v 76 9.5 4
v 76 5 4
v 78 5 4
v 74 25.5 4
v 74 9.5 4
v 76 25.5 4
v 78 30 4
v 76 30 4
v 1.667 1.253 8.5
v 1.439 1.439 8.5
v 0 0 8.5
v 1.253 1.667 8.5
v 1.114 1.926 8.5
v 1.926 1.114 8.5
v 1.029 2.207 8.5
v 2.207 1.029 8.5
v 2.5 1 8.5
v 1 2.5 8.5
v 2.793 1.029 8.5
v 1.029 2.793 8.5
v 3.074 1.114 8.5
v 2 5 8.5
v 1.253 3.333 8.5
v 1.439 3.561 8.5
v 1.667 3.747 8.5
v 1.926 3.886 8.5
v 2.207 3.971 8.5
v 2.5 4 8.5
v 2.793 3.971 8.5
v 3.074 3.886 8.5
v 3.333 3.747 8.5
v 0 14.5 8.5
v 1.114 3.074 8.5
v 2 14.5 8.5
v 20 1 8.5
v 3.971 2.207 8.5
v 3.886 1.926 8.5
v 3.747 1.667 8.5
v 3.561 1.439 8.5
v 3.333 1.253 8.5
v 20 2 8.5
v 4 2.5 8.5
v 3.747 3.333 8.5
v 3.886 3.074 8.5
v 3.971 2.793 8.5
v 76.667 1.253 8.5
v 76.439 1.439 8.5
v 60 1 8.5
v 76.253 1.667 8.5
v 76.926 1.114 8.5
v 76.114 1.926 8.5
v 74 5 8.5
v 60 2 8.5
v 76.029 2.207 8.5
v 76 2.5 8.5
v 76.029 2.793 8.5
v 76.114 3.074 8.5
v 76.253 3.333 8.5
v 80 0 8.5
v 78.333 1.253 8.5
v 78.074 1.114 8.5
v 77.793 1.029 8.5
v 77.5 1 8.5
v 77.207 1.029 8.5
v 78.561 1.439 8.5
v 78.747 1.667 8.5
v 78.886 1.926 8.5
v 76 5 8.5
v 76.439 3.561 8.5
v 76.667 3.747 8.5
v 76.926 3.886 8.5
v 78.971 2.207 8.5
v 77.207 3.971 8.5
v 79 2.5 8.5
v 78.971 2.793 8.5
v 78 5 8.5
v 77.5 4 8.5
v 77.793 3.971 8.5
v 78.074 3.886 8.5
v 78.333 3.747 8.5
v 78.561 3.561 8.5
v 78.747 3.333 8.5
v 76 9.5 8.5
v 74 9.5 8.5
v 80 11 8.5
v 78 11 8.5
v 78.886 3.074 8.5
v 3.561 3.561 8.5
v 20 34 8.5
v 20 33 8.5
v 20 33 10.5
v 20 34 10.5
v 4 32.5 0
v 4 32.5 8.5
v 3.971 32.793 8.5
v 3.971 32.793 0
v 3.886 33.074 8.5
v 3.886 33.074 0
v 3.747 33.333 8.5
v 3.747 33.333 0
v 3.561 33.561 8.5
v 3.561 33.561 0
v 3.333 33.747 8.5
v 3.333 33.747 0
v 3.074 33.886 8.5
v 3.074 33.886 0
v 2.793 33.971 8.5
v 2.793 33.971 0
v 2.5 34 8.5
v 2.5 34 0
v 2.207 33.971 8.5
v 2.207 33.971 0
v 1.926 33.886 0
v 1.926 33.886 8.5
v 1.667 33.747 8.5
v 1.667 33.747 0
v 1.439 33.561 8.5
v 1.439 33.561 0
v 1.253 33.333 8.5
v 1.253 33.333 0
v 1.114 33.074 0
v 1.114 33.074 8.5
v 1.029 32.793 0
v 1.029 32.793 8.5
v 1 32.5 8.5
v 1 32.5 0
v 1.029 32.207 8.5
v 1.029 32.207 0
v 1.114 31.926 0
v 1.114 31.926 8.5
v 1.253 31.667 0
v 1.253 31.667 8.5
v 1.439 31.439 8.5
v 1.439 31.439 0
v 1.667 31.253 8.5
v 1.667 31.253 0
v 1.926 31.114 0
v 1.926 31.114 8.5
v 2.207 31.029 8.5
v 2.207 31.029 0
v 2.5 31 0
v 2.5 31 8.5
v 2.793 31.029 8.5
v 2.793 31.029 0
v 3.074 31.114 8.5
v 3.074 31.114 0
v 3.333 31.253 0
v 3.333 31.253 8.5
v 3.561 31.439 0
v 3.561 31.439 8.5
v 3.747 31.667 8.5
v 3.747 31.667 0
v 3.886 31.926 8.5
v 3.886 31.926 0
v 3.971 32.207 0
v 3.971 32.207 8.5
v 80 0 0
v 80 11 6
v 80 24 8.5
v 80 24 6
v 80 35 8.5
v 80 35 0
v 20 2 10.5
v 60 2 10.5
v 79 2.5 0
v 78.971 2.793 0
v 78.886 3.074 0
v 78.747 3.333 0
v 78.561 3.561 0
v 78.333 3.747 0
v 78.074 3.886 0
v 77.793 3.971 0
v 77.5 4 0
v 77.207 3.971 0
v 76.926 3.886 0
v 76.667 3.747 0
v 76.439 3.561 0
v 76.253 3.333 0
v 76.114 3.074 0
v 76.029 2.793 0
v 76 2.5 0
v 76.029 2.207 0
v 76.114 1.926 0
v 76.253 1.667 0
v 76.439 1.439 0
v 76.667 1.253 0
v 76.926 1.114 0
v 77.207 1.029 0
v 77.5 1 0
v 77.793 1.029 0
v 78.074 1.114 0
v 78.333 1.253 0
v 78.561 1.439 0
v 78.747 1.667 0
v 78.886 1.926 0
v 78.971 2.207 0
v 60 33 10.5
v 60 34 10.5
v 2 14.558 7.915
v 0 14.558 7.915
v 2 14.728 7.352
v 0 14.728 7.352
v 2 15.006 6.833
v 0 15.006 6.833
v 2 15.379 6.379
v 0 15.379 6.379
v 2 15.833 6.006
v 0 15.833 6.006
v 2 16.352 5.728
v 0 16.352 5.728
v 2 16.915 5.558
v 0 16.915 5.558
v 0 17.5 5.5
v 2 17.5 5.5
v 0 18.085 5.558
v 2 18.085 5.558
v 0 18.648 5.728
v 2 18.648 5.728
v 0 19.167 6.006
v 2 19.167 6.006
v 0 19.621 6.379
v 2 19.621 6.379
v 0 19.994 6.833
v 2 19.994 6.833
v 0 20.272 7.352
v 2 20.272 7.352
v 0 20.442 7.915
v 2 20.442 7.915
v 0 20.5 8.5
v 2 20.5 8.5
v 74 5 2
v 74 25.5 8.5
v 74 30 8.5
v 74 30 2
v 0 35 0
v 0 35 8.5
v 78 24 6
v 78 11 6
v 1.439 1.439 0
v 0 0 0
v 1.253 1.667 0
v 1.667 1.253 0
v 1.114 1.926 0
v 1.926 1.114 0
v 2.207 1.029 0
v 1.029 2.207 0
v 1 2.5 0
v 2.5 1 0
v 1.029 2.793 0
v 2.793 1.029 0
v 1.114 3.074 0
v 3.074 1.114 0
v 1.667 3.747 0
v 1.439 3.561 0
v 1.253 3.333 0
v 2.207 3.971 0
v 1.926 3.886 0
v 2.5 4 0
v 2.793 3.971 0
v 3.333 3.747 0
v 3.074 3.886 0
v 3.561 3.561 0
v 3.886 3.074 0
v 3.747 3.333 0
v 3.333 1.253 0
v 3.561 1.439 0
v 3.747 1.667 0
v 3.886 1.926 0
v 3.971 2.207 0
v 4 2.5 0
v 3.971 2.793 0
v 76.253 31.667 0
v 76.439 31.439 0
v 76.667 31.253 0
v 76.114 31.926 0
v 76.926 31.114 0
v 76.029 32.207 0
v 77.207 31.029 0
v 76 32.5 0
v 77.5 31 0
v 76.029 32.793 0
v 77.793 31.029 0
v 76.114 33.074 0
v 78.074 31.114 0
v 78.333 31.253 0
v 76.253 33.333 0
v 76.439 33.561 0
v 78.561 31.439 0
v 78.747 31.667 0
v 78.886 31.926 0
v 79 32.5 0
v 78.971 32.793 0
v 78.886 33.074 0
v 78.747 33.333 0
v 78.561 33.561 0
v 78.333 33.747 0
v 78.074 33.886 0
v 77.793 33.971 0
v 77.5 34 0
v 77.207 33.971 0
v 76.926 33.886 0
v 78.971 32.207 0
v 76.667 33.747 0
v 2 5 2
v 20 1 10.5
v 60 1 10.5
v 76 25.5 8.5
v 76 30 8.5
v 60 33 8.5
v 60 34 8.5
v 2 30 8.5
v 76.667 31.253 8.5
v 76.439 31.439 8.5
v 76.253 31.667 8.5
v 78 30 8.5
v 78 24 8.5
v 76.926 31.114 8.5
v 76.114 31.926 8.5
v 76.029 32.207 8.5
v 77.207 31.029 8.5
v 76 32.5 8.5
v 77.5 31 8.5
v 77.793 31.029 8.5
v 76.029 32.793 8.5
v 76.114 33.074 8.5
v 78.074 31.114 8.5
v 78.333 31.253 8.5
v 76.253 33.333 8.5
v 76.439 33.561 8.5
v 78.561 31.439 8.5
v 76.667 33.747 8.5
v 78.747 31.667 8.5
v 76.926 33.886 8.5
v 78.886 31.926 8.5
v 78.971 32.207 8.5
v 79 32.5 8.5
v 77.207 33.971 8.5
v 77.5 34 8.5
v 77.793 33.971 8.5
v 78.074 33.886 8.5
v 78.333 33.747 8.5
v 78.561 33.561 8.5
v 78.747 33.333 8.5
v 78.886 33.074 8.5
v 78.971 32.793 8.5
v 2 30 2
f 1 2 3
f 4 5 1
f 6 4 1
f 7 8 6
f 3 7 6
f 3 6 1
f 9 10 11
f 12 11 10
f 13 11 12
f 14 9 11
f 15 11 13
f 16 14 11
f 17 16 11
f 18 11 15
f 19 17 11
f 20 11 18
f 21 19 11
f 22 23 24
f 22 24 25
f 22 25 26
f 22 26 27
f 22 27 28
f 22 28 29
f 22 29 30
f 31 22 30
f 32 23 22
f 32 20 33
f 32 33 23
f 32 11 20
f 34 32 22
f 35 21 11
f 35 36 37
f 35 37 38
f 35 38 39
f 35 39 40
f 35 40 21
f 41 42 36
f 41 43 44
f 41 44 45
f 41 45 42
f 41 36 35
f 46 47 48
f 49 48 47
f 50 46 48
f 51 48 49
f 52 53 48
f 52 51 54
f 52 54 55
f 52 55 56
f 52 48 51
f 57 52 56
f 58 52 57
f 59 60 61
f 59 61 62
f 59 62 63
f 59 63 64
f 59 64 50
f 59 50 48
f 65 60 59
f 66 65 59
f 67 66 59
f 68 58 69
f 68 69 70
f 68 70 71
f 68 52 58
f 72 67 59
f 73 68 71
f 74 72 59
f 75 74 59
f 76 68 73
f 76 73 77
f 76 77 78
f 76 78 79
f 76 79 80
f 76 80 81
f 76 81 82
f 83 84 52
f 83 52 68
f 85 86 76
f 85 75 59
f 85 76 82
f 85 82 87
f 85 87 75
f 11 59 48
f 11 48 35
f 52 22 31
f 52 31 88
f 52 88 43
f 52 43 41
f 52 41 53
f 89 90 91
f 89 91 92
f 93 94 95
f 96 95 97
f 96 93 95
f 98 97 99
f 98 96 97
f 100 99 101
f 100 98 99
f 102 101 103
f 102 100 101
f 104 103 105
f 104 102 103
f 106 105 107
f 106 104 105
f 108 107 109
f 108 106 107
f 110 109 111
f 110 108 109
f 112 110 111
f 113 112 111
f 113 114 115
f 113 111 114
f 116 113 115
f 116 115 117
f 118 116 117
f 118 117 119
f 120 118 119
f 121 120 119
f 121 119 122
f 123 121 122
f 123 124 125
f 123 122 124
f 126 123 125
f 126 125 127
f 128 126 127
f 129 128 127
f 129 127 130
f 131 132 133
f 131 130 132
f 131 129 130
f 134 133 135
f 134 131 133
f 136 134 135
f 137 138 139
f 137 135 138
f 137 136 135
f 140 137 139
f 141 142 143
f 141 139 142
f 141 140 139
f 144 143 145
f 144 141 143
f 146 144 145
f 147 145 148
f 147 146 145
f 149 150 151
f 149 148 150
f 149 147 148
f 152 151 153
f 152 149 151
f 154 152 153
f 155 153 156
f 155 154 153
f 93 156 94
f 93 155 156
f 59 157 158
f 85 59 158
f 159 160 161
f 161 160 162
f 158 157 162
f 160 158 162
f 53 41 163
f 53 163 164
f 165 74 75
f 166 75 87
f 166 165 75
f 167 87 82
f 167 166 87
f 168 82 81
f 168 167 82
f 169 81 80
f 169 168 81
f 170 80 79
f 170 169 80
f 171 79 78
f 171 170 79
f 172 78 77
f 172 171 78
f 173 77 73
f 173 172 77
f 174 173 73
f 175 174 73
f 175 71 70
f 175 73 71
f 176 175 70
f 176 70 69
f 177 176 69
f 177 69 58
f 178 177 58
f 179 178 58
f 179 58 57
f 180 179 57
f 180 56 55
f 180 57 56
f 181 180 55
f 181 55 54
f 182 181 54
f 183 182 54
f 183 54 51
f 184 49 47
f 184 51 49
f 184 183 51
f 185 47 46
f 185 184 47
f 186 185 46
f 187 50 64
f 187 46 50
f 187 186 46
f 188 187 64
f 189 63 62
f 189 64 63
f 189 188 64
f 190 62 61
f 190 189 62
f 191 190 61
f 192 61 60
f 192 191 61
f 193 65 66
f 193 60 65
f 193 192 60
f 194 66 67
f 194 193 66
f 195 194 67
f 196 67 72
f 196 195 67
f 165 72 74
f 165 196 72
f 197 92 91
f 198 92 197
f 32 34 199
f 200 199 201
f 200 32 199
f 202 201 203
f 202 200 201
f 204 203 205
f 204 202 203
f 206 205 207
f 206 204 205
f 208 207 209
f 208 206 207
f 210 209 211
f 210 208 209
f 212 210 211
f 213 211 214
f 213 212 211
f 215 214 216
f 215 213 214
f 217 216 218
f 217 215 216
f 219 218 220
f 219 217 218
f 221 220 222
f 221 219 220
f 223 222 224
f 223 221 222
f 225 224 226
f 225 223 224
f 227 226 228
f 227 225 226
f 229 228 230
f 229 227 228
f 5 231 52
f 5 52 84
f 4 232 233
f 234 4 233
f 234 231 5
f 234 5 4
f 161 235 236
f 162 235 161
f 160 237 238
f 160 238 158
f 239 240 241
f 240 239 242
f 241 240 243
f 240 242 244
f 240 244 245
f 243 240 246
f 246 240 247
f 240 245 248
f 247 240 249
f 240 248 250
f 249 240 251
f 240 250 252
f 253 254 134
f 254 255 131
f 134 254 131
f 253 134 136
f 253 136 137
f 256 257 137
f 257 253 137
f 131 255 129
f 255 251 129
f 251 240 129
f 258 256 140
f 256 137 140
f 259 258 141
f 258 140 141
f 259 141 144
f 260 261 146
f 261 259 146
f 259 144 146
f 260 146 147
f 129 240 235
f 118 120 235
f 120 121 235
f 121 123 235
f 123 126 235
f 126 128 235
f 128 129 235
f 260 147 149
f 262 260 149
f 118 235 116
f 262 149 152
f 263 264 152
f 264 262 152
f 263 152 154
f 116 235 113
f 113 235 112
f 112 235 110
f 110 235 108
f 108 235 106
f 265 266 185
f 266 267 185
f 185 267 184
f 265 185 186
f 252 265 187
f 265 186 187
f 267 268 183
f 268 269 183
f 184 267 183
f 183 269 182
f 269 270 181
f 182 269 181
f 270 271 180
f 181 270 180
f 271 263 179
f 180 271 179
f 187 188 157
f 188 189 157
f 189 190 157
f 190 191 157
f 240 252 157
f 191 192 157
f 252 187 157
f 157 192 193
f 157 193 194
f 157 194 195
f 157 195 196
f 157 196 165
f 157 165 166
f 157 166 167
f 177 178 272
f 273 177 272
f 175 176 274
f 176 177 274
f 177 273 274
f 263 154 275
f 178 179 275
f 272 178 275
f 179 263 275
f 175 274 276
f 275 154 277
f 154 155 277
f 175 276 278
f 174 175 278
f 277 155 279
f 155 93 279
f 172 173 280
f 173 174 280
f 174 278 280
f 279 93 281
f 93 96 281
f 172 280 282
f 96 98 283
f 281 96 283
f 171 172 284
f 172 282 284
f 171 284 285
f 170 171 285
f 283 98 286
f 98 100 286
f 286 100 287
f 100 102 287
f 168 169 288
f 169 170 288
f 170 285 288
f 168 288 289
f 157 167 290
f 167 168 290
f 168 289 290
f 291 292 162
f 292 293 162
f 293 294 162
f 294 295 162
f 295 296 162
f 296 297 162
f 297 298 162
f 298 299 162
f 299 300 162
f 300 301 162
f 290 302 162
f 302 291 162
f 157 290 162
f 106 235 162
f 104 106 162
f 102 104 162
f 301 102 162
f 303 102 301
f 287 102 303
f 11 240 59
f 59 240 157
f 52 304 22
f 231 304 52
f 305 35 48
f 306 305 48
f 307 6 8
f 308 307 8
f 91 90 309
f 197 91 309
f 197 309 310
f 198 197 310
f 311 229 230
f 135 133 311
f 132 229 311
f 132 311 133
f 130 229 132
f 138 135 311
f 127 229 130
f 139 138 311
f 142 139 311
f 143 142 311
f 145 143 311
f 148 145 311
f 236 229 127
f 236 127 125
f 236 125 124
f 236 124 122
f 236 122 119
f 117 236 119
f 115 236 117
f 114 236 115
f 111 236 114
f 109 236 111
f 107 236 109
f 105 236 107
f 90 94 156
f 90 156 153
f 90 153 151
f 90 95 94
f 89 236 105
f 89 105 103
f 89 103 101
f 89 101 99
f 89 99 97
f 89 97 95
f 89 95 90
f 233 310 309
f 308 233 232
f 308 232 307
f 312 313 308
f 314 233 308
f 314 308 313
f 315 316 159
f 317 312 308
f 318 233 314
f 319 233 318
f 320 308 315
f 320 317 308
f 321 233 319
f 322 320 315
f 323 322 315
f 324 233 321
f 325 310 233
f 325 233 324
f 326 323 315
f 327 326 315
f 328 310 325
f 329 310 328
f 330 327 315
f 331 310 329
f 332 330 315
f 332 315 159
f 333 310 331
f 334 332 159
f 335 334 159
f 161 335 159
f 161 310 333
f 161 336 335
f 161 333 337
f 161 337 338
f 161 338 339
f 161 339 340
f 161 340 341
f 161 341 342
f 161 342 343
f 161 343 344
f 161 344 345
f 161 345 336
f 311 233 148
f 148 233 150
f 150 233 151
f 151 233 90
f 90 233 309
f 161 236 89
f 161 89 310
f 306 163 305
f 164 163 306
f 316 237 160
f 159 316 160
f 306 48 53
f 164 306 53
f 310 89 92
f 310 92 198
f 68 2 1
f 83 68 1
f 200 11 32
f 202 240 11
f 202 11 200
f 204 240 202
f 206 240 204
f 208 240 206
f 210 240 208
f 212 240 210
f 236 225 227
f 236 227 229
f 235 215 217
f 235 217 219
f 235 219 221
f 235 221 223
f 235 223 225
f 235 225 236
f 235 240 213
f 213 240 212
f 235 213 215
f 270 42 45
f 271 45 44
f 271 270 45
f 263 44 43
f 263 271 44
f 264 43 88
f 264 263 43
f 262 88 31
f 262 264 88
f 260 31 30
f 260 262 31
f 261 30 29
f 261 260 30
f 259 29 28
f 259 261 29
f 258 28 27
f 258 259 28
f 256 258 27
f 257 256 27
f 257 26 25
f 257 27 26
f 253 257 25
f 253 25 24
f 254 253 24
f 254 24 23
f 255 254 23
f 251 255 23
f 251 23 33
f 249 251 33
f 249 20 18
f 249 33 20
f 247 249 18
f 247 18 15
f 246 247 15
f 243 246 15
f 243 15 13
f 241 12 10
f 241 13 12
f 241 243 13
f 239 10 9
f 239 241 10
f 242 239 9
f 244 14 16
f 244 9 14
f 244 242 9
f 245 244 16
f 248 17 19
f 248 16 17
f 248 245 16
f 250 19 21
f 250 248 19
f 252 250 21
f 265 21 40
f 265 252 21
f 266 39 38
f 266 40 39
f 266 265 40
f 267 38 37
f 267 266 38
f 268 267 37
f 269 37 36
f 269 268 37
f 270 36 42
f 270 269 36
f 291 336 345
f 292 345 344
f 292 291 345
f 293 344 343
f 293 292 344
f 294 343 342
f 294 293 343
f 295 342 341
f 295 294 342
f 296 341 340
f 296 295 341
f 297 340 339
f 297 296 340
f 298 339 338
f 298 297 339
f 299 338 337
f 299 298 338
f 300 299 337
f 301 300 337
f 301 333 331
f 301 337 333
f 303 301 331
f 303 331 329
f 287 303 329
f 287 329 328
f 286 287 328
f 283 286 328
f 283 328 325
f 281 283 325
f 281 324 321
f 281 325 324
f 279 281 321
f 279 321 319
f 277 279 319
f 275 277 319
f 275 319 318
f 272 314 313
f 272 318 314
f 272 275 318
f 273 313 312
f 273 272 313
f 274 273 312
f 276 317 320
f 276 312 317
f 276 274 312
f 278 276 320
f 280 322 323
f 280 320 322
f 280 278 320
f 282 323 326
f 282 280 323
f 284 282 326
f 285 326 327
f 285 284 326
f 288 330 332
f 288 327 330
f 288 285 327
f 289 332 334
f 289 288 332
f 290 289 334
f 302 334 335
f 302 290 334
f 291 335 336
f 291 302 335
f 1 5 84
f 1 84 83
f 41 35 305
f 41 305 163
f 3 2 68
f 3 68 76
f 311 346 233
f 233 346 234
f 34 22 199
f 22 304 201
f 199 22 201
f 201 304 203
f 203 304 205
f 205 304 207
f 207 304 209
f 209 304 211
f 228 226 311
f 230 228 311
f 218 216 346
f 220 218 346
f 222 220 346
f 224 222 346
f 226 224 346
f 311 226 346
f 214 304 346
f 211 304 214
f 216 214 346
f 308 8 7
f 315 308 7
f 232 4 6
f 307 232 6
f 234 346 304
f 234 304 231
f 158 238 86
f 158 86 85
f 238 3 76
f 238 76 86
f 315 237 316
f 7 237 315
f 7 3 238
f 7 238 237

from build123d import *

# Parameters (mm, degrees)
CYLINDER004_R        = 1.5
CYLINDER004_DEPTH    = 10
CYLINDER003_R        = 1.5
CYLINDER003_DEPTH    = 10
CYLINDER002_R        = 1.5
CYLINDER002_DEPTH    = 10
CYLINDER001_R        = 1.5
CYLINDER001_DEPTH    = 10
BOX007_W             = 40
BOX007_H             = 1
BOX007_DEPTH         = 10.5
BOX006_W             = 40
BOX006_H             = 1
BOX006_DEPTH         = 10.5
BOX005_W             = 3
BOX005_H             = 25
BOX005_DEPTH         = 10
BOX004_W             = 2
BOX004_H             = 16
BOX004_DEPTH         = 9
BOX003_W             = 2
BOX003_H             = 13
BOX003_DEPTH         = 5
BOX002_W             = 2
BOX002_H             = 25
BOX002_DEPTH         = 9
BOX001_W             = 69
BOX001_H             = 25
BOX001_DEPTH         = 13
CYLINDER_R           = 3
CYLINDER_DEPTH       = 2
CYLINDER_PITCH_ANGLE = 90
BOX_W                = 80
BOX_H                = 35
BOX_DEPTH            = 8.5


with BuildPart() as cylinder004:
    # Cylinder004 → Cylinder004 (new body)
    with BuildSketch(Plane(origin=(2.5, 32.5, 0), x_dir=(1, 0, 0), z_dir=(0, 0, 1))):
        Circle(CYLINDER004_R)
    extrude(amount=CYLINDER004_DEPTH)


with BuildPart() as cylinder003:
    # Cylinder003 → Cylinder003 (new body)
    with BuildSketch(Plane(origin=(77.5, 32.5, 0), x_dir=(1, 0, 0), z_dir=(0, 0, 1))):
        Circle(CYLINDER003_R)
    extrude(amount=CYLINDER003_DEPTH)


with BuildPart() as cylinder002:
    # Cylinder002 → Cylinder002 (new body)
    with BuildSketch(Plane(origin=(77.5, 2.5, 0), x_dir=(1, 0, 0), z_dir=(0, 0, 1))):
        Circle(CYLINDER002_R)
    extrude(amount=CYLINDER002_DEPTH)


with BuildPart() as cylinder001:
    # Cylinder001 → Cylinder001 (new body)
    with BuildSketch(Plane(origin=(2.5, 2.5, 0), x_dir=(1, 0, 0), z_dir=(0, 0, 1))):
        Circle(CYLINDER001_R)
    extrude(amount=CYLINDER001_DEPTH)


with BuildPart() as box007:
    # Box007 → Box007 (new body)
    with BuildSketch(Plane(origin=(20, 1, 0), x_dir=(1, 0, 0), z_dir=(0, 0, 1))):
        with Locations((20, 0.5)):
            Rectangle(BOX007_W, BOX007_H)
    extrude(amount=BOX007_DEPTH)


with BuildPart() as box006:
    # Box006 → Box006 (new body)
    with BuildSketch(Plane(origin=(20, 33, 0), x_dir=(1, 0, 0), z_dir=(0, 0, 1))):
        with Locations((20, 0.5)):
            Rectangle(BOX006_W, BOX006_H)
    extrude(amount=BOX006_DEPTH)


with BuildPart() as box005:
    # Box005 → Box005 (new body)
    with BuildSketch(Plane(origin=(2, 5, 2), x_dir=(1, 0, 0), z_dir=(0, 0, 1))):
        with Locations((1.5, 12.5)):
            Rectangle(BOX005_W, BOX005_H)
    extrude(amount=BOX005_DEPTH)


with BuildPart() as box004:
    # Box004 → Box004 (new body)
    with BuildSketch(Plane(origin=(74, 9.5, 4), x_dir=(1, 0, 0), z_dir=(0, 0, 1))):
        with Locations((1, 8)):
            Rectangle(BOX004_W, BOX004_H)
    extrude(amount=BOX004_DEPTH)


with BuildPart() as u:
    # Box003 → Box003 (new body)
    with BuildSketch(Plane(origin=(78, 11, 6), x_dir=(1, 0, 0), z_dir=(0, 0, 1))):
        with Locations((1, 6.5)):
            Rectangle(BOX003_W, BOX003_H)
    extrude(amount=BOX003_DEPTH)


with BuildPart() as box002:
    # Box002 → Box002 (new body)
    with BuildSketch(Plane(origin=(76, 5, 4), x_dir=(1, 0, 0), z_dir=(0, 0, 1))):
        with Locations((1, 12.5)):
            Rectangle(BOX002_W, BOX002_H)
    extrude(amount=BOX002_DEPTH)


with BuildPart() as box001:
    # Box001 → Box001 (new body)
    with BuildSketch(Plane(origin=(5, 5, 2), x_dir=(1, 0, 0), z_dir=(0, 0, 1))):
        with Locations((34.5, 12.5)):
            Rectangle(BOX001_W, BOX001_H)
    extrude(amount=BOX001_DEPTH)


with BuildPart() as cylinder:
    # Cylinder → Cylinder (new body)
    with BuildSketch(Plane.XY):
        Circle(CYLINDER_R)
    extrude(amount=CYLINDER_DEPTH)


with BuildPart() as cylinder_1:
    # Cylinder pitch: moved
    add(cylinder.part.rotate(Axis((0, 0, 0), (0, 1, 0)), CYLINDER_PITCH_ANGLE))


with BuildPart() as cylinder_2:
    # Cylinder placement: moved
    add(cylinder_1.part.moved(Location((0, 17.5, 8.5))))


with BuildPart() as cut009:
    # Box → Box (new body)
    with BuildSketch(Plane.XY):
        with Locations((40, 17.5)):
            Rectangle(BOX_W, BOX_H)
    extrude(amount=BOX_DEPTH)

    # Cut: cut Cylinder
    add(cylinder_2.part, mode=Mode.SUBTRACT)

    # Cut001: cut Box001
    add(box001.part, mode=Mode.SUBTRACT)

    # Cut002: cut Box002
    add(box002.part, mode=Mode.SUBTRACT)

    # Cut003: cut U口
    add(u.part, mode=Mode.SUBTRACT)

    # Cut004: cut Box004
    add(box004.part, mode=Mode.SUBTRACT)

    # Cut005: cut Box005
    add(box005.part, mode=Mode.SUBTRACT)

    # Fusion: union Box006
    add(box006.part)

    # Fusion001: union Box007
    add(box007.part)

    # Cut006: cut Cylinder001
    add(cylinder001.part, mode=Mode.SUBTRACT)

    # Cut007: cut Cylinder002
    add(cylinder002.part, mode=Mode.SUBTRACT)

    # Cut008: cut Cylinder003
    add(cylinder003.part, mode=Mode.SUBTRACT)

    # Cut009: cut Cylinder004
    add(cylinder004.part, mode=Mode.SUBTRACT)


solid = cut009.part
